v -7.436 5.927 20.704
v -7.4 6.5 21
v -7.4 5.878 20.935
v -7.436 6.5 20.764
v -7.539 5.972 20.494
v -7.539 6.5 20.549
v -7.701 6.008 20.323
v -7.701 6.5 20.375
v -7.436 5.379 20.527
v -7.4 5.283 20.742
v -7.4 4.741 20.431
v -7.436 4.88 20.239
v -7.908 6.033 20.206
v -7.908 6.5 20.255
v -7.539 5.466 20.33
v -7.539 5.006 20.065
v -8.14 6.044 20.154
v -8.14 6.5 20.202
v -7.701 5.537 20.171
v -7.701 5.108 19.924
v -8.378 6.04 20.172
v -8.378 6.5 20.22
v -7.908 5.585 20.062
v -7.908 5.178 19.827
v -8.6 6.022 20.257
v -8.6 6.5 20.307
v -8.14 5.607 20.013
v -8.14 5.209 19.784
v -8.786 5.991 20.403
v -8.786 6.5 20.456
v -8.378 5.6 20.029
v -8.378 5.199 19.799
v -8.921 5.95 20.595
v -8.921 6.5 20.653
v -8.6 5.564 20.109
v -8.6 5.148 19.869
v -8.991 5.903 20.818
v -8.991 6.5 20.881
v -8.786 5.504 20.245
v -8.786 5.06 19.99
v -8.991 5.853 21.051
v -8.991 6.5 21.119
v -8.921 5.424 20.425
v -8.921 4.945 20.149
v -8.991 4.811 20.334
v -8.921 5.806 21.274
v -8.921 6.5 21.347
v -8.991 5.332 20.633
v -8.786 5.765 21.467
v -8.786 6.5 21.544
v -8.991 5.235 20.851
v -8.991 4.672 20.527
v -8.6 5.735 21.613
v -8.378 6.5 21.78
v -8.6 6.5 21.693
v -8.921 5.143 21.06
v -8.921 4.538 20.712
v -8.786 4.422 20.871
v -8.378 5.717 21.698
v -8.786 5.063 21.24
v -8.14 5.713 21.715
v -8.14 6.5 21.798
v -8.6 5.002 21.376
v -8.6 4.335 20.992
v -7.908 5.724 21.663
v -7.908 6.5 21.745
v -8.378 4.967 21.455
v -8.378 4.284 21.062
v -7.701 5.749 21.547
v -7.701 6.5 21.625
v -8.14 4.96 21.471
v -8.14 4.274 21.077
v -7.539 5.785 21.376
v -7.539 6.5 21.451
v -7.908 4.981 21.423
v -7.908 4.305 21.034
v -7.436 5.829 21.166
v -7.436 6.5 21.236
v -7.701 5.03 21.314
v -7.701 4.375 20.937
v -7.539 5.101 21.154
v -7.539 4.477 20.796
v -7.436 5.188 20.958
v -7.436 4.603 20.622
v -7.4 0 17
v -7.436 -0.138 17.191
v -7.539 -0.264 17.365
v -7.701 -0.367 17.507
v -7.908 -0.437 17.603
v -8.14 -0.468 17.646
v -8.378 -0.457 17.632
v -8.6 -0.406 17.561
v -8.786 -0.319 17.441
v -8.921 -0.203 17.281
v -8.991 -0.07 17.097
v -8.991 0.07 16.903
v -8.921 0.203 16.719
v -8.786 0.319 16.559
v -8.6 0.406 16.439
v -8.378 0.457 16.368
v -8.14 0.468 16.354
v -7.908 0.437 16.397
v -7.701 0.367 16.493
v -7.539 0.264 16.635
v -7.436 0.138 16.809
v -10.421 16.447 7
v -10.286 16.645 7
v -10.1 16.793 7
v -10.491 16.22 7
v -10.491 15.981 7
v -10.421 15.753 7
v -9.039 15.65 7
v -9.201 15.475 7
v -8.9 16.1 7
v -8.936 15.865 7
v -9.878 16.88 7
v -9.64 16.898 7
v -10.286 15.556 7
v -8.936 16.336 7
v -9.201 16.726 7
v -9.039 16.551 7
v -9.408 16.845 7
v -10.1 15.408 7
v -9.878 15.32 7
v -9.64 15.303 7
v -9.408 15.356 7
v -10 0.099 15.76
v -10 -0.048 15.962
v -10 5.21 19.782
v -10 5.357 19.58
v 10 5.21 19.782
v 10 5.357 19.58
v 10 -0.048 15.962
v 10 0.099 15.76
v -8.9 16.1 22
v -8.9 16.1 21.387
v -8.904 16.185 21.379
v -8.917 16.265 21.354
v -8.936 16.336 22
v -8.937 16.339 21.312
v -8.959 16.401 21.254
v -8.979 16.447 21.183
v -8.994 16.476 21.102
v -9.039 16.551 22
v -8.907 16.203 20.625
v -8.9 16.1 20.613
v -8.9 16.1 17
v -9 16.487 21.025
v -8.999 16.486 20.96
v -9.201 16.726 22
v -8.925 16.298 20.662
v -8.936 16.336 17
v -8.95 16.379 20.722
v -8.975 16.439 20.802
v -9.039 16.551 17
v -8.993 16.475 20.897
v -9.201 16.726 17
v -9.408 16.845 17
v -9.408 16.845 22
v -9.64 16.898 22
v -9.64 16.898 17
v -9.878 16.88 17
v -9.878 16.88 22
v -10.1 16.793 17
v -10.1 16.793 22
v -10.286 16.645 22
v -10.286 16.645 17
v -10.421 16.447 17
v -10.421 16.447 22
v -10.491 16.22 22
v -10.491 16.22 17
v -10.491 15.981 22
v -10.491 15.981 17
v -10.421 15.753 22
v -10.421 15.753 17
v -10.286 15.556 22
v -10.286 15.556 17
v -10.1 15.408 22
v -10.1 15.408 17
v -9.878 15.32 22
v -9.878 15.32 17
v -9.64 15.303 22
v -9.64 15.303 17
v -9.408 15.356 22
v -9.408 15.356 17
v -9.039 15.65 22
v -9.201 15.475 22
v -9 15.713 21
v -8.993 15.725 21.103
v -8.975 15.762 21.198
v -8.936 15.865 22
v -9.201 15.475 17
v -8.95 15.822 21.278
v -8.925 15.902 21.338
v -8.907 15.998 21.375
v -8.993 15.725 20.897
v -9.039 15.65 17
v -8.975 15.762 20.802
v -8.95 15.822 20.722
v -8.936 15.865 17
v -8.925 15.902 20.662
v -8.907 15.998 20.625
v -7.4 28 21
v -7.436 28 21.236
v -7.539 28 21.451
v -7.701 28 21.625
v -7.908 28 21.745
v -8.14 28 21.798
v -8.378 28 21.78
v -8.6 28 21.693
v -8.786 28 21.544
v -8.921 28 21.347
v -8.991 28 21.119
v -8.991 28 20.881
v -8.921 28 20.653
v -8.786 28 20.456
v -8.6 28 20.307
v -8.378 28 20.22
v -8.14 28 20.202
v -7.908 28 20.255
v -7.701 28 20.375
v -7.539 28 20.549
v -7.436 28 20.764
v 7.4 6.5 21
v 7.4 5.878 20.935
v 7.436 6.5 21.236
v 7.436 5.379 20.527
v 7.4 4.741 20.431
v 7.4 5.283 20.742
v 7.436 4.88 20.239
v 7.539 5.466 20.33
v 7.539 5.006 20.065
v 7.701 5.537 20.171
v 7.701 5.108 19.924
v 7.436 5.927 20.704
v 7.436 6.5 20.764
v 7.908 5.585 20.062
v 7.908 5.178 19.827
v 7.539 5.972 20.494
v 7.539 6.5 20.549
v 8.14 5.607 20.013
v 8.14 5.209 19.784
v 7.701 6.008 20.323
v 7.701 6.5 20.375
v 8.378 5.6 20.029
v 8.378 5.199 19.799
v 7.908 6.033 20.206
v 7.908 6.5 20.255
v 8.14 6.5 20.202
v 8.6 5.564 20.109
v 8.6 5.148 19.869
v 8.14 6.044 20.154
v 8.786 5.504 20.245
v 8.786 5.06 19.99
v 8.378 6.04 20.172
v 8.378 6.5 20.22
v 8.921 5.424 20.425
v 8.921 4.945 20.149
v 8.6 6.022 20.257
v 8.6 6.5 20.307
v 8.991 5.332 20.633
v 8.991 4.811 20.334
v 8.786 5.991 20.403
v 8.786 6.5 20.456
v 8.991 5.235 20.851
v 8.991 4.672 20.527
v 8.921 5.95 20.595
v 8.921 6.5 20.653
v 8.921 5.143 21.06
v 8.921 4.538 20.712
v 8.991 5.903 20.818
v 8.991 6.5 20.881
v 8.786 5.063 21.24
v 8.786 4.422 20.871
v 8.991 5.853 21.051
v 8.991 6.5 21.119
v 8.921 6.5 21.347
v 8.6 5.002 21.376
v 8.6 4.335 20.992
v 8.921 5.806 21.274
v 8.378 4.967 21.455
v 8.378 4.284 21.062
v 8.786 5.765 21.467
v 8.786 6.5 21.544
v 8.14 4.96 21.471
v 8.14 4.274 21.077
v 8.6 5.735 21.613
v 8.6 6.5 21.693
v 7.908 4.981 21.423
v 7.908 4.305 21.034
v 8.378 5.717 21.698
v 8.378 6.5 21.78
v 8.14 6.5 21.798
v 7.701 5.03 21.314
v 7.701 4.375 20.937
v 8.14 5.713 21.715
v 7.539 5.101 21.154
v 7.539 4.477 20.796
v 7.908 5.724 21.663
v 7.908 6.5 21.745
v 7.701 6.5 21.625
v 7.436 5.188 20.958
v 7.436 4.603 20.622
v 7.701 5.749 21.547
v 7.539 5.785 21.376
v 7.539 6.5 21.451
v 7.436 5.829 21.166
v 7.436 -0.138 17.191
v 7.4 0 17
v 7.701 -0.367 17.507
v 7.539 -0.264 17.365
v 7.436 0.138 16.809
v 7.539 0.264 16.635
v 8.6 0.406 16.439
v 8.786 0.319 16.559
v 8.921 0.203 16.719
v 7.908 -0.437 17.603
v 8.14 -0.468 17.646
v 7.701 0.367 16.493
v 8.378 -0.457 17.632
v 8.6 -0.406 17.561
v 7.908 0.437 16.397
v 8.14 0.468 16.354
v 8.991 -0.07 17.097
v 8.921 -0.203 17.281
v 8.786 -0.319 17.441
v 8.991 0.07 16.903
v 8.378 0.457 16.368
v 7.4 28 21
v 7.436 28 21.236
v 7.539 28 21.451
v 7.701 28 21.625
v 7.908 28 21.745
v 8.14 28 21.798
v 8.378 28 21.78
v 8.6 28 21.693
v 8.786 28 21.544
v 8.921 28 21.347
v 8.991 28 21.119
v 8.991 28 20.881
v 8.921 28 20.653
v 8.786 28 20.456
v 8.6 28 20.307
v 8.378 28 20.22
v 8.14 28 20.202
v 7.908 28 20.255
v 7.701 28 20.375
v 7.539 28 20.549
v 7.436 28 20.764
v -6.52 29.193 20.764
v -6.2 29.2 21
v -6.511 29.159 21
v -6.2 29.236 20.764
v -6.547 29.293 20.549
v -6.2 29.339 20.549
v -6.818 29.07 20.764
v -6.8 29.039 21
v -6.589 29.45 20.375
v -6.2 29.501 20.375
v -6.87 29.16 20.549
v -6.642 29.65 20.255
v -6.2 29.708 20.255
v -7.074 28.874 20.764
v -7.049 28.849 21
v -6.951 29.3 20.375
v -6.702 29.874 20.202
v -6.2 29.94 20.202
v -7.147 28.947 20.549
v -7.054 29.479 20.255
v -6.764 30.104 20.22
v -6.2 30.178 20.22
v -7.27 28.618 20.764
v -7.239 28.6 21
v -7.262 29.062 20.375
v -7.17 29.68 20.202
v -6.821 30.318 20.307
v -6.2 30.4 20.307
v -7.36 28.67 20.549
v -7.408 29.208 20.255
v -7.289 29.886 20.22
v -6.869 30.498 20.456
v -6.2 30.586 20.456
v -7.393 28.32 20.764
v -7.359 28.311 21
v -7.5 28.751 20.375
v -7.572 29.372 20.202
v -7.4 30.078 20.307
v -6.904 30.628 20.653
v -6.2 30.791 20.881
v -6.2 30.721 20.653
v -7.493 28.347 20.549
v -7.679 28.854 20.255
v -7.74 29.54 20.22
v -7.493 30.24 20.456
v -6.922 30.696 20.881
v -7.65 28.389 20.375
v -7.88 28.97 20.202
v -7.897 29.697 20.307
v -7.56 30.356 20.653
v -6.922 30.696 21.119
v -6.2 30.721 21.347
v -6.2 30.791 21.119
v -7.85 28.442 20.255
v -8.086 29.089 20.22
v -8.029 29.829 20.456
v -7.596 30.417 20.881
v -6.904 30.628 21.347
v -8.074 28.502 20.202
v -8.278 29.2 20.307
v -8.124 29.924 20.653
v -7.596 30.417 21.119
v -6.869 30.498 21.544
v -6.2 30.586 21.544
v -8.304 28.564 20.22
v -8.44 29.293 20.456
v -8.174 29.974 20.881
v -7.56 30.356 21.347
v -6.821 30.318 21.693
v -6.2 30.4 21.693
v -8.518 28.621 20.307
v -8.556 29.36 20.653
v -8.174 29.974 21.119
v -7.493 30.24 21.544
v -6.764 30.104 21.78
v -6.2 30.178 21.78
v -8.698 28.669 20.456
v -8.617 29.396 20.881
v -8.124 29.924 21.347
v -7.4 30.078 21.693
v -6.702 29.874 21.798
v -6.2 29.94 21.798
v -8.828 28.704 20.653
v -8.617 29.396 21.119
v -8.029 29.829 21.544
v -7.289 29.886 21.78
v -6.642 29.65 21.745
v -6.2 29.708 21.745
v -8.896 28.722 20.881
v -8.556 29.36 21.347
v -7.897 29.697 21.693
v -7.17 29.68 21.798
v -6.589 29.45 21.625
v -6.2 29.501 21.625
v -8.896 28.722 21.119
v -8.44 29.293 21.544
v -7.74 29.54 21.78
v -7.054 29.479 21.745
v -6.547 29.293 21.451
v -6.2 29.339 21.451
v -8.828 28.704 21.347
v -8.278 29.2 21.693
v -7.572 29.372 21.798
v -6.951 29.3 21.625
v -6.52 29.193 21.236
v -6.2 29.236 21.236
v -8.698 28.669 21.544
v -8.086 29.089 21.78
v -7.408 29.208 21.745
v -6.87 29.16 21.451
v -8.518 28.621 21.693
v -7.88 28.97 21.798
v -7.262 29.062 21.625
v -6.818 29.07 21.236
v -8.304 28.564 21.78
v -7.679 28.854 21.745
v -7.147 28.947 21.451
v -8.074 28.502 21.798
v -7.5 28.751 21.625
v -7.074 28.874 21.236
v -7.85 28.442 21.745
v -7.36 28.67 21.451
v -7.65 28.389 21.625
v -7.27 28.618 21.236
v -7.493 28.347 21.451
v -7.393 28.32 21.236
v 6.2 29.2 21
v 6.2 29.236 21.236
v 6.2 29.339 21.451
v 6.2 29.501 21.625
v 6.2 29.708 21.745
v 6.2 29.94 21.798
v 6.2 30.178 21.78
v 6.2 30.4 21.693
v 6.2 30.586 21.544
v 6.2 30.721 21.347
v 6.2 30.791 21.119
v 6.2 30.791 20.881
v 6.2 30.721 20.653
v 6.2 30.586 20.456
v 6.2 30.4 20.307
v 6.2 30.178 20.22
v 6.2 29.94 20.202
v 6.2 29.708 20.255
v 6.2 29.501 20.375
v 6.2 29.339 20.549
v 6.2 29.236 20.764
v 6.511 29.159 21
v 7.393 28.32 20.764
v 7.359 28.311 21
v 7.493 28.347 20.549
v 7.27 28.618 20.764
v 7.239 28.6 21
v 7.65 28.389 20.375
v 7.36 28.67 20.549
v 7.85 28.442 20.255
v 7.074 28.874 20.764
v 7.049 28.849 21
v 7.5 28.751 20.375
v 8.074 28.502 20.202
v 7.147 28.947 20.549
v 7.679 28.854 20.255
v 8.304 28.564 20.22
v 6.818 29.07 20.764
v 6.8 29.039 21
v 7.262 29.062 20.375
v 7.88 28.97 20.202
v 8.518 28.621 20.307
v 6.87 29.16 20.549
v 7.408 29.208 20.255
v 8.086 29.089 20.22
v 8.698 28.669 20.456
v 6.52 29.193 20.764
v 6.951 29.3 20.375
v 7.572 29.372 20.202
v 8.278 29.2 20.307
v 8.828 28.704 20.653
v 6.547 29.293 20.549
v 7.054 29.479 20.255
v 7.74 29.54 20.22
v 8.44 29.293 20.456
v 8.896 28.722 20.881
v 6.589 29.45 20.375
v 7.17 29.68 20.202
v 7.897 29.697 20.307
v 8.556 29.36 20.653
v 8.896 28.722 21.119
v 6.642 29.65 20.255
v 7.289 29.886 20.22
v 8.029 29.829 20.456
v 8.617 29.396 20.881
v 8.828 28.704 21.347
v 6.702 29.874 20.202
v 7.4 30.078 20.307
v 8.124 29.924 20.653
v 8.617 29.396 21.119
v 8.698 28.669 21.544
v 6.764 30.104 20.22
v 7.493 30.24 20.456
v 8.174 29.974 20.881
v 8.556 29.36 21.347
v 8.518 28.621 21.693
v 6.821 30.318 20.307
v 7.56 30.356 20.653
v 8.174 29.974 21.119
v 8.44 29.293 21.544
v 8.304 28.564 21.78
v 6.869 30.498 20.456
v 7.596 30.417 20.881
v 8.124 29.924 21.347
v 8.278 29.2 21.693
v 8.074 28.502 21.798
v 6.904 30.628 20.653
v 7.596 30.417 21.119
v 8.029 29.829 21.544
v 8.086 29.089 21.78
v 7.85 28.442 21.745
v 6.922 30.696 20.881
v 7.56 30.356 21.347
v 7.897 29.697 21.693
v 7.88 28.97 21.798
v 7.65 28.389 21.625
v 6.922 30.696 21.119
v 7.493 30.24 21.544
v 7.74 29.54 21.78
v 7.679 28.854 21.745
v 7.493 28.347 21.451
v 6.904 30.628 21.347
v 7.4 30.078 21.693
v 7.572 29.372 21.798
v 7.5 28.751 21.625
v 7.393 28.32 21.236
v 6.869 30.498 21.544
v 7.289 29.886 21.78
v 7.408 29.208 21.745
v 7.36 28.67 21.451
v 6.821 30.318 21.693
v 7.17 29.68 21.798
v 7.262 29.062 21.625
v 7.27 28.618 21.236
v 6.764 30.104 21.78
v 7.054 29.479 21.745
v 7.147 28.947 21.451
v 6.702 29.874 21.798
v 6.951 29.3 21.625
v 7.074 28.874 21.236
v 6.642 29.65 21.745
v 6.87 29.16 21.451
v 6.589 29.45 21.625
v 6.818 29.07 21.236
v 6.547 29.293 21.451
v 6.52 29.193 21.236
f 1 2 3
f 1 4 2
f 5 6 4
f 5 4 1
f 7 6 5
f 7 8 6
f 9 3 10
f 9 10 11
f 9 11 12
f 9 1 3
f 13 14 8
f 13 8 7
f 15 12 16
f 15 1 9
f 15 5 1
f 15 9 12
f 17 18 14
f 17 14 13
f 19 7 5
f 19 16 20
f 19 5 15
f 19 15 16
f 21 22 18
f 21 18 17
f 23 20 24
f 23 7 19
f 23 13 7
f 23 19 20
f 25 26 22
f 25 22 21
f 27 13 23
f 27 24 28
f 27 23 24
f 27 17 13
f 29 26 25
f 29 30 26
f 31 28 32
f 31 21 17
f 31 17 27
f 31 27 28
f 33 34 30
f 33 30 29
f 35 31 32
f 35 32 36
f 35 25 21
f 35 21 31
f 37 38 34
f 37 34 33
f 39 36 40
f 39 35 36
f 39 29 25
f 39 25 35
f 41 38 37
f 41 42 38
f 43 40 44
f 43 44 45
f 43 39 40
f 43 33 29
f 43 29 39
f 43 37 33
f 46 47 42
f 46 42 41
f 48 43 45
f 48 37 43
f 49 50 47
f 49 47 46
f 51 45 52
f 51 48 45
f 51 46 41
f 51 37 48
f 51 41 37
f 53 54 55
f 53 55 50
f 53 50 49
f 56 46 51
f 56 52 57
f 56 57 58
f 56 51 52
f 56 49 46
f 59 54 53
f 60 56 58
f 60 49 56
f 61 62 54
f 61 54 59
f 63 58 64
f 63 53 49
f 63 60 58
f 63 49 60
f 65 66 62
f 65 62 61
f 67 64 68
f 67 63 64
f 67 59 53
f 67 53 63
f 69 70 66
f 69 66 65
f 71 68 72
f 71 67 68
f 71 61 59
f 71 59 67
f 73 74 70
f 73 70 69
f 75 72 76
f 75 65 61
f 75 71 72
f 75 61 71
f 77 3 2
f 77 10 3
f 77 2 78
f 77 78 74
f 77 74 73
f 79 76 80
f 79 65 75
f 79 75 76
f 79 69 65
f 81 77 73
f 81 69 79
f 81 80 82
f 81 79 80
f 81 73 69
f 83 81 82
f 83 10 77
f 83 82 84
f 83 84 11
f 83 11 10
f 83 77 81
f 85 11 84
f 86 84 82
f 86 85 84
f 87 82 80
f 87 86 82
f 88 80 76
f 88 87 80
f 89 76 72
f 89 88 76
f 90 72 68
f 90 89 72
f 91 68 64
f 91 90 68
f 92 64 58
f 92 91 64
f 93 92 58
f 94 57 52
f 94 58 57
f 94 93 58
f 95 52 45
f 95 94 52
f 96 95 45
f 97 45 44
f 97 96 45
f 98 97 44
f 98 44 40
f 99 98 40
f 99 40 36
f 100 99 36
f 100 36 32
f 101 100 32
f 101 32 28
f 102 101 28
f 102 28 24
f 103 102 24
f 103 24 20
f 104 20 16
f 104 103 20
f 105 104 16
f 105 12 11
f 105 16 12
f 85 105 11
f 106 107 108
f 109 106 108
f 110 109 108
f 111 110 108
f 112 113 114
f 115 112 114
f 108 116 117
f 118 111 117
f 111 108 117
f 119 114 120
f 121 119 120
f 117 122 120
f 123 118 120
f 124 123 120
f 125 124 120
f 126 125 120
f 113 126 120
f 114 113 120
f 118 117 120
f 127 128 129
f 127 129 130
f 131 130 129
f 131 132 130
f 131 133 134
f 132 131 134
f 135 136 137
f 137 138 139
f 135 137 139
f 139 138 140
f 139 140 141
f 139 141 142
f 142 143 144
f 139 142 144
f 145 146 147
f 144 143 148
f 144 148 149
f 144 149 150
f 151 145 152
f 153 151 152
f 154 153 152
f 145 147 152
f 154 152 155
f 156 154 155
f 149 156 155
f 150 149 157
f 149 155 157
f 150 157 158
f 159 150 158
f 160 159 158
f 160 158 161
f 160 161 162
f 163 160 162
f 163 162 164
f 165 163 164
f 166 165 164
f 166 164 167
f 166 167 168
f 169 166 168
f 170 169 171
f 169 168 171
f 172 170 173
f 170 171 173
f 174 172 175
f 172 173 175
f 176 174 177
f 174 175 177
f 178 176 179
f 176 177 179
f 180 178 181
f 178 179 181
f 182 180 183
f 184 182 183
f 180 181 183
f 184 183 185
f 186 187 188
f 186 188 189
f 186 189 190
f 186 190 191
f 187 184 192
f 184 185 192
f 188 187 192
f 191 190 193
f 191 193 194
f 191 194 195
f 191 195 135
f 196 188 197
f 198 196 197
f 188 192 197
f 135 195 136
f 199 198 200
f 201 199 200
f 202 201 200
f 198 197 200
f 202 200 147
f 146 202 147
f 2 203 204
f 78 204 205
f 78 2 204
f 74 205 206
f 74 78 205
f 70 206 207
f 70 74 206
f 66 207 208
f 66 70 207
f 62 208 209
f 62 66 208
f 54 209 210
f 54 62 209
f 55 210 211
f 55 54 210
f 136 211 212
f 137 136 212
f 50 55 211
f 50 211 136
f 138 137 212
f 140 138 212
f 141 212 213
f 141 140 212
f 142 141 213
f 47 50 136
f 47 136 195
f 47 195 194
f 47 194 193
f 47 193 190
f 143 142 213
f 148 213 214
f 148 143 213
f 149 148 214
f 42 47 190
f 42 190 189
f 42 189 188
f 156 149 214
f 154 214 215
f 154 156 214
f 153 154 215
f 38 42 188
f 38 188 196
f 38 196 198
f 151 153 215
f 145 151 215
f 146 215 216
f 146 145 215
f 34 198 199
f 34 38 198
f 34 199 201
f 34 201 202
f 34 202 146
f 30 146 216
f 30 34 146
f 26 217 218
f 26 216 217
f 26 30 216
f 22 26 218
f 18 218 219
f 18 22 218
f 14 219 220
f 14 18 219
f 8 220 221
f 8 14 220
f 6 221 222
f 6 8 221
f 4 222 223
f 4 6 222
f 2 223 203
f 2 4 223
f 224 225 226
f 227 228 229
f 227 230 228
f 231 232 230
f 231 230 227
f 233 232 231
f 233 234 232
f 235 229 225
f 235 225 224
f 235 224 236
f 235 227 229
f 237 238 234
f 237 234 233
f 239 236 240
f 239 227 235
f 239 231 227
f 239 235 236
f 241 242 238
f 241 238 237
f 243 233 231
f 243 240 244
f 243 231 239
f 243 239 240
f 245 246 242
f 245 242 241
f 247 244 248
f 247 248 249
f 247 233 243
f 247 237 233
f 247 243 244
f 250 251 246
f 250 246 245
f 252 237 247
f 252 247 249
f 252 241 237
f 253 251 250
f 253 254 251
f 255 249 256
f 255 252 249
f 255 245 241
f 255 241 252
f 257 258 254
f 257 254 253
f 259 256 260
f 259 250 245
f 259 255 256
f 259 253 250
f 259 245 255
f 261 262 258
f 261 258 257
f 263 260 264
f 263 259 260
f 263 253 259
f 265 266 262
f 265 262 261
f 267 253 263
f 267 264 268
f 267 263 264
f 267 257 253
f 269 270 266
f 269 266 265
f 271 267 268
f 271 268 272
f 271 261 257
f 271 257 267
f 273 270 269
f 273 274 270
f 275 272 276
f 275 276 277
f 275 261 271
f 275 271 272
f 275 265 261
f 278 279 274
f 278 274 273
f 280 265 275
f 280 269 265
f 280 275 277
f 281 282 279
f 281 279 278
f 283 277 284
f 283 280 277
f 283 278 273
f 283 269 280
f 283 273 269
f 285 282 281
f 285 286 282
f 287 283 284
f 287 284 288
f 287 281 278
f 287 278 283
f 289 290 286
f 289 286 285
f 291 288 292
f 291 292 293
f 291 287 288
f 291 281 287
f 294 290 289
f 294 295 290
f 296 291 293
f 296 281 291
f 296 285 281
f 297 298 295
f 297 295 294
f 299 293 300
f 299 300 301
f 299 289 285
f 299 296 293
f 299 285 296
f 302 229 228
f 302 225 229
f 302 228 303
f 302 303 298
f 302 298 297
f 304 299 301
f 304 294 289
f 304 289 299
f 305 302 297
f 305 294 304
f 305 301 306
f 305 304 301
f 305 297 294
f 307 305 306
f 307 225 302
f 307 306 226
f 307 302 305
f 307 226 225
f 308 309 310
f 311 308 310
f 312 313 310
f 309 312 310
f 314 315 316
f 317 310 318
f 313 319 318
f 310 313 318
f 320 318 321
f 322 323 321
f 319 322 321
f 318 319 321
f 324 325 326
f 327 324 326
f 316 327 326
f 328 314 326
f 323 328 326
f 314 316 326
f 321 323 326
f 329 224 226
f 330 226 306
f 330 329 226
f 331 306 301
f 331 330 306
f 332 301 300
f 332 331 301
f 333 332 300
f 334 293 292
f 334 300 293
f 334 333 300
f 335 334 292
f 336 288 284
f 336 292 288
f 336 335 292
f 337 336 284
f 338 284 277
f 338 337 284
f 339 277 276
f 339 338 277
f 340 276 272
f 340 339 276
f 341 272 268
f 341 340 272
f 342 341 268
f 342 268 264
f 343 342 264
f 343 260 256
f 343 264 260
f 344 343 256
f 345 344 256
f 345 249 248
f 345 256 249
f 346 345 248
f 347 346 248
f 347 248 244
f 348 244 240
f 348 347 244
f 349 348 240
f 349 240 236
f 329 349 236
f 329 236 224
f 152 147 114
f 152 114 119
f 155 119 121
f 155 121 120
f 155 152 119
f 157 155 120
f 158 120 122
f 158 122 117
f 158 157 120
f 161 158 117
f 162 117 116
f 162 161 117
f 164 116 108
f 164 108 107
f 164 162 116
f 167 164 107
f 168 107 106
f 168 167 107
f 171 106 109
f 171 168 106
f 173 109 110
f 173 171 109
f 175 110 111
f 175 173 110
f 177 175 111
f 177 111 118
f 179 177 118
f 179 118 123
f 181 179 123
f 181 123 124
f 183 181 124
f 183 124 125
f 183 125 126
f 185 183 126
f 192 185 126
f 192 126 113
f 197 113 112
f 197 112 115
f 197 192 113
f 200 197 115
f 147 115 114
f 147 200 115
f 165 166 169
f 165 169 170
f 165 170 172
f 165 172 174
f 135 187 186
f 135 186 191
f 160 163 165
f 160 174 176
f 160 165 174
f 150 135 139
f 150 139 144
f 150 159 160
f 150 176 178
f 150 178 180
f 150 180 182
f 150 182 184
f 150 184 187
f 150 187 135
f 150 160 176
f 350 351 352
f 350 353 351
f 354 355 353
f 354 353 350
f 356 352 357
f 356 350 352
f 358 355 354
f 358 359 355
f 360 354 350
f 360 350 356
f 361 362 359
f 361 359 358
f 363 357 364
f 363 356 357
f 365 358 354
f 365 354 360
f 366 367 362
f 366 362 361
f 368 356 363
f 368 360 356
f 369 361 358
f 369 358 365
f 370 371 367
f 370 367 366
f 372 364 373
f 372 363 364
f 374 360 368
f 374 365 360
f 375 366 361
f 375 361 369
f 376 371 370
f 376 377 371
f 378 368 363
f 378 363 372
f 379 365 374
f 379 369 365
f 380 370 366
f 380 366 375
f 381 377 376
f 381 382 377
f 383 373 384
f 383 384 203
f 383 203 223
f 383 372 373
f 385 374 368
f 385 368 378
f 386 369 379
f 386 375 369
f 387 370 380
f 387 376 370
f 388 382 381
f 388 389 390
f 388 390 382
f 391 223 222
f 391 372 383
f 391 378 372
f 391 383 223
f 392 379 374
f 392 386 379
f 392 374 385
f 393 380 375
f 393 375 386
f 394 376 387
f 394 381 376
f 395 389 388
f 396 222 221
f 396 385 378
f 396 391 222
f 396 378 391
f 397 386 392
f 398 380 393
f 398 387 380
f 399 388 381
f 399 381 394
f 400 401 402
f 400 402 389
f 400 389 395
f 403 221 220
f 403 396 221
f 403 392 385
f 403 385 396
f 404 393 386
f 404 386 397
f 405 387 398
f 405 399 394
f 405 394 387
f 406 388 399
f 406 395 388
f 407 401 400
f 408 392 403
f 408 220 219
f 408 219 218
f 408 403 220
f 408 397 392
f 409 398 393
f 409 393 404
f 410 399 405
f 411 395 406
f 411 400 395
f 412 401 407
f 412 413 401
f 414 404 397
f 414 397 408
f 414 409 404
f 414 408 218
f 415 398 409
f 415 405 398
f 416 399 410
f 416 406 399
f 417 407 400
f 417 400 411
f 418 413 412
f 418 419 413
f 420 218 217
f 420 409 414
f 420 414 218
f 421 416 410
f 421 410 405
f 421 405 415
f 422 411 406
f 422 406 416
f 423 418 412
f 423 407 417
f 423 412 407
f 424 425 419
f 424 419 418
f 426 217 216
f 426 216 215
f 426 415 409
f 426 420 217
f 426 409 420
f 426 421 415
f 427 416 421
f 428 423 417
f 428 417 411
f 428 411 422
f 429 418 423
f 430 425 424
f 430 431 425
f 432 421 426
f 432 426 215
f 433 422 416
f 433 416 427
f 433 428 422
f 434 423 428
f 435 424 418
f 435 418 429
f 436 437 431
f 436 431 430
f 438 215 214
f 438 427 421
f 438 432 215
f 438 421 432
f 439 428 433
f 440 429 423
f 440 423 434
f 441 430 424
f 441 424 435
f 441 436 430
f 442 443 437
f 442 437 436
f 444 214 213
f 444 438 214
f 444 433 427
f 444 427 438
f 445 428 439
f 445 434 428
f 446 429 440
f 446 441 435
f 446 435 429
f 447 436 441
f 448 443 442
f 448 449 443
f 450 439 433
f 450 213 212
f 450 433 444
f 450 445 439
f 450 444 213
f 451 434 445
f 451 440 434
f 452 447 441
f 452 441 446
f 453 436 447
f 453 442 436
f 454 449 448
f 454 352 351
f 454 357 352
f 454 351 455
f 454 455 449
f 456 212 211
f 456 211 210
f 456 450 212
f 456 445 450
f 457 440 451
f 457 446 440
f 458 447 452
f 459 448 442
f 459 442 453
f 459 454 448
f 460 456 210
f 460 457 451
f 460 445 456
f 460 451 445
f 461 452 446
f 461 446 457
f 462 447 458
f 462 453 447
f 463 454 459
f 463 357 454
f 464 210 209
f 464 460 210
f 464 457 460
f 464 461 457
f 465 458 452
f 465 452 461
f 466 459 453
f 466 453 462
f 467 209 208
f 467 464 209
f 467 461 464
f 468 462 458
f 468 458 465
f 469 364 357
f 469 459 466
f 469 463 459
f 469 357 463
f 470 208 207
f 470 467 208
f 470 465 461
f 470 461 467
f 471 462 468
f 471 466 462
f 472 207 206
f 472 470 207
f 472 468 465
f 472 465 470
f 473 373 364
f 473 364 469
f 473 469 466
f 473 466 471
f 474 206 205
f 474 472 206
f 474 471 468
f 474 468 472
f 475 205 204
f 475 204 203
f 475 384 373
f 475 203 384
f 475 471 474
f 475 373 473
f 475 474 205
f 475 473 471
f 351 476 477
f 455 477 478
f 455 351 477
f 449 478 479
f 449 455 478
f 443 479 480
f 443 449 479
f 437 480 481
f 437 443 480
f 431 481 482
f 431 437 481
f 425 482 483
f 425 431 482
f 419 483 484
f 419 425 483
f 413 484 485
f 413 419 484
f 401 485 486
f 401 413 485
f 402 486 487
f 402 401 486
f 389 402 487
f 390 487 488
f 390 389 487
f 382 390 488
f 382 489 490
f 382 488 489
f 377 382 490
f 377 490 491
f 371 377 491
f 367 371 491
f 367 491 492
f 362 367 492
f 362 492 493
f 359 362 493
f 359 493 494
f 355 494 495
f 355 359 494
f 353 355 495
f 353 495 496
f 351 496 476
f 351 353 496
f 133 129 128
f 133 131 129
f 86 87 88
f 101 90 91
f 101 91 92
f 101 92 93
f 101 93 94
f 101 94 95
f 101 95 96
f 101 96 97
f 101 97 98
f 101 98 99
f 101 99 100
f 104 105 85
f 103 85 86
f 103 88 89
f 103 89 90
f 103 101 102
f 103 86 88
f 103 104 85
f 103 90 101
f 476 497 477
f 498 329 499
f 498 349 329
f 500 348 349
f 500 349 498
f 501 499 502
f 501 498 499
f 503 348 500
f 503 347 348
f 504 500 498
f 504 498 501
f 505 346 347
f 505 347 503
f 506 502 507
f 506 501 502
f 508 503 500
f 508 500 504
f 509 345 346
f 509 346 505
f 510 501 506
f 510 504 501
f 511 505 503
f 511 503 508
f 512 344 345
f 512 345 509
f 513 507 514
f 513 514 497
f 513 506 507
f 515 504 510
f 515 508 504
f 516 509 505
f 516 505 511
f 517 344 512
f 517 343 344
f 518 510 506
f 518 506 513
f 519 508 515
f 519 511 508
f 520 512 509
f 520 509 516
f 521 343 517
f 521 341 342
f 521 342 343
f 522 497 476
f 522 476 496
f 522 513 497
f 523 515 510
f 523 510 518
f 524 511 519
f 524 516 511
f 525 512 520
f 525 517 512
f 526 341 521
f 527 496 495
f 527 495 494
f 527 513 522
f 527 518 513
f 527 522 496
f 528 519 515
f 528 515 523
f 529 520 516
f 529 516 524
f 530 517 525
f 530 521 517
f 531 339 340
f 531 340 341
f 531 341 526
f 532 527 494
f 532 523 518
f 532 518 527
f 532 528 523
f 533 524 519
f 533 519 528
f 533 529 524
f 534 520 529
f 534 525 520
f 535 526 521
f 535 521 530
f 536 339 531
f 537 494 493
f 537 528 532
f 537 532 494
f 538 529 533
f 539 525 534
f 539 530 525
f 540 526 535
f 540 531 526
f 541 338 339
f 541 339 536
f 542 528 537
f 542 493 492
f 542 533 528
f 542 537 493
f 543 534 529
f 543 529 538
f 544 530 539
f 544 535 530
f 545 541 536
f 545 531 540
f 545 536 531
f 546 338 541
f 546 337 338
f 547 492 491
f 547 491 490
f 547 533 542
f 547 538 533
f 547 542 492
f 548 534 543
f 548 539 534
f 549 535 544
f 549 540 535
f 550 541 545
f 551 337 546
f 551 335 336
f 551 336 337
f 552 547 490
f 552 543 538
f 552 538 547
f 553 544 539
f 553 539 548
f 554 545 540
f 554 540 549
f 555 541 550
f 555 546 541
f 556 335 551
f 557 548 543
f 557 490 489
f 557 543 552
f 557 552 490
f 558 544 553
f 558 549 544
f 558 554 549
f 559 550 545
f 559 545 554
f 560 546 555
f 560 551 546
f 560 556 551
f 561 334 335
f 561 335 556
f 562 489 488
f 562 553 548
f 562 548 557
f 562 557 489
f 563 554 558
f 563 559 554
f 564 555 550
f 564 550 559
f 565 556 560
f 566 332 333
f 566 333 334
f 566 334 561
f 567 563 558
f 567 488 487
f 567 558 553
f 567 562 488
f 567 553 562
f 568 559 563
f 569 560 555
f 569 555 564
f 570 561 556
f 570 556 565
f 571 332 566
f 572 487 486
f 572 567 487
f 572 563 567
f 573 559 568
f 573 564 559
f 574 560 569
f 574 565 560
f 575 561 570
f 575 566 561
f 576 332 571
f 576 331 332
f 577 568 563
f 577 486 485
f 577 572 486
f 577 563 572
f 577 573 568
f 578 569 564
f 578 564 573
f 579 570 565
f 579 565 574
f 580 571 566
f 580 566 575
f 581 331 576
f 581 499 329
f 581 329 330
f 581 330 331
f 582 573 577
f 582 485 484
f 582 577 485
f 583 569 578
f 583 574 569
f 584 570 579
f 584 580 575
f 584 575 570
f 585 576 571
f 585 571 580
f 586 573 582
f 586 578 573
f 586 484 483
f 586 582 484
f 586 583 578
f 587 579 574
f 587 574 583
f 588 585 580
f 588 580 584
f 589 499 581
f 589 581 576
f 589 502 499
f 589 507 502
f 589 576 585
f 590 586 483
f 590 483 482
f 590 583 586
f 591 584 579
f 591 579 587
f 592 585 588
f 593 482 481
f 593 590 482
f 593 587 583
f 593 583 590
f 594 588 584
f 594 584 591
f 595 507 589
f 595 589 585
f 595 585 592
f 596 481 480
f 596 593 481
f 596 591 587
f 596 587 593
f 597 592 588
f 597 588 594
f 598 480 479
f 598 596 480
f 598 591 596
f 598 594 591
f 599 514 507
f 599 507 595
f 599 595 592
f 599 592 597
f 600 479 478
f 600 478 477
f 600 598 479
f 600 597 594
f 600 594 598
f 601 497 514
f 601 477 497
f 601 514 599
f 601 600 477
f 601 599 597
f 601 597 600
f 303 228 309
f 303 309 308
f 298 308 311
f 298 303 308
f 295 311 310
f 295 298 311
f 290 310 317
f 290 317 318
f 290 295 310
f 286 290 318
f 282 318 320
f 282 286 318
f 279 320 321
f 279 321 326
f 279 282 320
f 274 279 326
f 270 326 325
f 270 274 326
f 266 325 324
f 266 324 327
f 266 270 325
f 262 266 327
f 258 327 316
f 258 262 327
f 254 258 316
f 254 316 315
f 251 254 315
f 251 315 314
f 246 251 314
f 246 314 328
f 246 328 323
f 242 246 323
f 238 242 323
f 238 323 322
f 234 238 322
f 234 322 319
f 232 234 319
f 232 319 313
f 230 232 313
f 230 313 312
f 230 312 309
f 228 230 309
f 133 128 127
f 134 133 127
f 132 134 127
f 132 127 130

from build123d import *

# Parameters (mm, degrees)
SKETCH2_R                = 0.8
EXTRUDE1_DEPTH           = 5
EXTRUDE1_DEPTH_BACK      = 10
SKETCH3_R                = 0.8
EXTRUDE_THIN1_DEPTH      = 10
EXTRUDE_THIN1_DEPTH_BACK = 10


with BuildPart() as part:
    # Sweep1: sweep along a curve in space
    with BuildLine() as sweep1_path:
        Line((8.2, 0, 17), (8.2, 4.741455494, 20.430539286))
        ThreePointArc((8.2, 4.741455494, 20.430539286), (8.2, 5.575775422, 20.854086356), (8.2, 6.5, 21))
        Line((8.2, 6.5, 21), (8.2, 28, 21))
        ThreePointArc((8.2, 28, 21), (7.614213562, 29.414213562, 21), (6.2, 30, 21))
        Line((6.2, 30, 21), (-6.2, 30, 21))
        ThreePointArc((-8.2, 28, 21), (-7.614213562, 29.414213562, 21), (-6.2, 30, 21))
        Line((-8.2, 28, 21), (-8.2, 6.5, 21))
        ThreePointArc((-8.2, 6.5, 21), (-8.2, 5.575775422, 20.854086356), (-8.2, 4.741455494, 20.430539286))
        Line((-8.2, 4.741455494, 20.430539286), (-8.2, 0, 17))
    # Sketch2 → Sweep1 (sweep)
    with BuildSketch(Plane(origin=(8.2, 0, 17), x_dir=(-1, 0, 0), z_dir=(0, 0.810179762077197, 0.586181501858031))):
        Circle(SKETCH2_R)
    sweep(path=sweep1_path.line)

    # Sketch3 → Extrude1 (add, two sides: drawn at the far end of the back side and taken through both)
    with BuildSketch(Plane.XY.offset(17).offset(-EXTRUDE1_DEPTH_BACK)):
        with Locations((-9.7, 16.100381126)):
            Circle(SKETCH3_R)
    extrude(amount=EXTRUDE1_DEPTH + EXTRUDE1_DEPTH_BACK)


with BuildPart() as body_2:
    # Sketch4 → Extrude-Thin1 (new, two sides: drawn at the far end of the back side and taken through both)
    with BuildSketch(Plane(origin=(0, 0, 0), x_dir=(0, 0, -1), z_dir=(1, 0, 0)).offset(-EXTRUDE_THIN1_DEPTH_BACK)):
        Polygon((-19.782395477, 5.210400696), (-15.961791337, -0.048209768), (-15.759537088, 0.098736546), (-19.580141228, 5.357347009), align=None)
    extrude(amount=EXTRUDE_THIN1_DEPTH + EXTRUDE_THIN1_DEPTH_BACK)


solid = Compound([part.part, body_2.part])
